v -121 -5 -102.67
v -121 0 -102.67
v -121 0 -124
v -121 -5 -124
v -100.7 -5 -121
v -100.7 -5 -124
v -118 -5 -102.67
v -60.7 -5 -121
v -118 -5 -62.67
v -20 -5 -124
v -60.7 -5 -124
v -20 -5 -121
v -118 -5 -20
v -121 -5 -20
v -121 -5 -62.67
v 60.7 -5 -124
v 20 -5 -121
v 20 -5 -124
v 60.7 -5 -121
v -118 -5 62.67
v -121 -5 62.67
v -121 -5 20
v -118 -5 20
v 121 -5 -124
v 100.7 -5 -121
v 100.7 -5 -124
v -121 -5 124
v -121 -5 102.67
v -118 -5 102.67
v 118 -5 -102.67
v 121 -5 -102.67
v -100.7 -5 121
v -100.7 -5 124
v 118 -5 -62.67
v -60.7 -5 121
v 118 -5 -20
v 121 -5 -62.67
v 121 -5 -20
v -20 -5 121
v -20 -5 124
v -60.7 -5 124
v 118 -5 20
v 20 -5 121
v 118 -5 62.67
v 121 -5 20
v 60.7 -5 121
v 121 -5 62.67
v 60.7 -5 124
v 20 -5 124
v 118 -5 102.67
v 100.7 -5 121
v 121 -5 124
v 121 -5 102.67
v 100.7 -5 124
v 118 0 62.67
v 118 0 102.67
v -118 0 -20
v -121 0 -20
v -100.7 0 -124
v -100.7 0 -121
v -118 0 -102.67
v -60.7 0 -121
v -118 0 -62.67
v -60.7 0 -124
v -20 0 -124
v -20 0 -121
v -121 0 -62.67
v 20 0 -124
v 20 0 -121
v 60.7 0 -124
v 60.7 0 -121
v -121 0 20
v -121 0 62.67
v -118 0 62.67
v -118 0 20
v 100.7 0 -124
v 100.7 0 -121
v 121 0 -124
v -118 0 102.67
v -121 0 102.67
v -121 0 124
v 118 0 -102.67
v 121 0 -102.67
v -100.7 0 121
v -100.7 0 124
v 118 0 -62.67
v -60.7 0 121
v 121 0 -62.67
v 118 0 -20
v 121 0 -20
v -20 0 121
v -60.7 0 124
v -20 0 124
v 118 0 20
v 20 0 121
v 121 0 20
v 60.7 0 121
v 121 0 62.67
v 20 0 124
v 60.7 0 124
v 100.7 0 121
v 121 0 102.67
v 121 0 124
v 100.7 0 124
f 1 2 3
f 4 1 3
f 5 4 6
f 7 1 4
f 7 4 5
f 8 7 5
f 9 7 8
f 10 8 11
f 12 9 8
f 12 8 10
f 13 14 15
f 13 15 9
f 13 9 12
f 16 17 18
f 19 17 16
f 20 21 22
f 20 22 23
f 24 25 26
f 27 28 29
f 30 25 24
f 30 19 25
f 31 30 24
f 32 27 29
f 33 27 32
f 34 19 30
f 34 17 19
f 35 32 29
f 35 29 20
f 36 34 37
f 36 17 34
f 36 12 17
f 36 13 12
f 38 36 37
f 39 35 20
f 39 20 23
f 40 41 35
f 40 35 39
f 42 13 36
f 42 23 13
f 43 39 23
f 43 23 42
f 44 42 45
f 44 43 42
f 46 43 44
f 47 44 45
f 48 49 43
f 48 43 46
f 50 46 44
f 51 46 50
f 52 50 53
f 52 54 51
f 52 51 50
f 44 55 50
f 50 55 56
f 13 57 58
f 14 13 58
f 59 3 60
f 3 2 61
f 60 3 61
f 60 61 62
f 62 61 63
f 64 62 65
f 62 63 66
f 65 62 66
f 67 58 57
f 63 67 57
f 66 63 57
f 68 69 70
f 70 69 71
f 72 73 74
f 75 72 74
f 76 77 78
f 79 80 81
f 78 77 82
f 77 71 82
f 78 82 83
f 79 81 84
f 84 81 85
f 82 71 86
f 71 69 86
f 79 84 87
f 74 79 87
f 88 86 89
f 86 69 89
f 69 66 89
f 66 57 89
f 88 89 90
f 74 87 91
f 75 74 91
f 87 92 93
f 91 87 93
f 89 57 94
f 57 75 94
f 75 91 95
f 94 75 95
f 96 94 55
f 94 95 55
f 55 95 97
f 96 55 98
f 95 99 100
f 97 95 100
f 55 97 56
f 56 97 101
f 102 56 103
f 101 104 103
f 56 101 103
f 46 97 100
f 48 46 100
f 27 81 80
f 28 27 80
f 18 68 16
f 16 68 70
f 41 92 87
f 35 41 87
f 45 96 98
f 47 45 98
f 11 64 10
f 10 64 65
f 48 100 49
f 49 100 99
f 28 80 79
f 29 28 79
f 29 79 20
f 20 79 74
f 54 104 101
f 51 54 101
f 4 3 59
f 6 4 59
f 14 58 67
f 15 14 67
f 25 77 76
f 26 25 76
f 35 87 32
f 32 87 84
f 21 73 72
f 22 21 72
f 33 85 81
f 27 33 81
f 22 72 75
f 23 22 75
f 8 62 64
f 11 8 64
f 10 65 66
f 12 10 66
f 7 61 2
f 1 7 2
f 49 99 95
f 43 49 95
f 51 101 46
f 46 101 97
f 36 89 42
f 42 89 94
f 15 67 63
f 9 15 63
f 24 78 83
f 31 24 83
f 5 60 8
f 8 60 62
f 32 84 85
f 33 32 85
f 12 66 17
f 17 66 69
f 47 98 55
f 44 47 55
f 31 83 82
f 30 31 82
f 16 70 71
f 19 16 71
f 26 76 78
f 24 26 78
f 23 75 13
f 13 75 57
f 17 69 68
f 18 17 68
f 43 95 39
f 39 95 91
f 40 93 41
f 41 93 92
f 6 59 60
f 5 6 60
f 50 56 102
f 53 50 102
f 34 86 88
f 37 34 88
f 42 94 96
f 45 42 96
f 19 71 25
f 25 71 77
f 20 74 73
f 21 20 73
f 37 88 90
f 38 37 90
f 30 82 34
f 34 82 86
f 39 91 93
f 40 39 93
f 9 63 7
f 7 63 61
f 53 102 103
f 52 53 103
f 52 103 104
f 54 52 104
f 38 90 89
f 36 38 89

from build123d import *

# Parameters (mm, degrees)
F1_DEPTH = 5


with BuildPart() as f1:
    # F0 (on Front) → F1 (new body)
    with BuildSketch(Plane.XZ):
        Polygon((100.7, -124), (121, -124), (121, -102.67), (118, -102.67), (118, -62.67), (121, -62.67), (121, -20), (118, -20), (118, 20), (121, 20), (121, 62.67), (118, 62.67), (118, 102.67), (121, 102.67), (121, 124), (100.7, 124), (100.7, 121), (60.7, 121), (60.7, 124), (20, 124), (20, 121), (-20, 121), (-20, 124), (-60.7, 124), (-60.7, 121), (-100.7, 121), (-100.7, 124), (-121, 124), (-121, 102.67), (-118, 102.67), (-118, 62.67), (-121, 62.67), (-121, 20), (-118, 20), (-118, -20), (-121, -20), (-121, -62.67), (-118, -62.67), (-118, -102.67), (-121, -102.67), (-121, -124), (-100.7, -124), (-100.7, -121), (-60.7, -121), (-60.7, -124), (-20, -124), (-20, -121), (20, -121), (20, -124), (60.7, -124), (60.7, -121), (100.7, -121), align=None)
    extrude(amount=F1_DEPTH)


solid = f1.part
